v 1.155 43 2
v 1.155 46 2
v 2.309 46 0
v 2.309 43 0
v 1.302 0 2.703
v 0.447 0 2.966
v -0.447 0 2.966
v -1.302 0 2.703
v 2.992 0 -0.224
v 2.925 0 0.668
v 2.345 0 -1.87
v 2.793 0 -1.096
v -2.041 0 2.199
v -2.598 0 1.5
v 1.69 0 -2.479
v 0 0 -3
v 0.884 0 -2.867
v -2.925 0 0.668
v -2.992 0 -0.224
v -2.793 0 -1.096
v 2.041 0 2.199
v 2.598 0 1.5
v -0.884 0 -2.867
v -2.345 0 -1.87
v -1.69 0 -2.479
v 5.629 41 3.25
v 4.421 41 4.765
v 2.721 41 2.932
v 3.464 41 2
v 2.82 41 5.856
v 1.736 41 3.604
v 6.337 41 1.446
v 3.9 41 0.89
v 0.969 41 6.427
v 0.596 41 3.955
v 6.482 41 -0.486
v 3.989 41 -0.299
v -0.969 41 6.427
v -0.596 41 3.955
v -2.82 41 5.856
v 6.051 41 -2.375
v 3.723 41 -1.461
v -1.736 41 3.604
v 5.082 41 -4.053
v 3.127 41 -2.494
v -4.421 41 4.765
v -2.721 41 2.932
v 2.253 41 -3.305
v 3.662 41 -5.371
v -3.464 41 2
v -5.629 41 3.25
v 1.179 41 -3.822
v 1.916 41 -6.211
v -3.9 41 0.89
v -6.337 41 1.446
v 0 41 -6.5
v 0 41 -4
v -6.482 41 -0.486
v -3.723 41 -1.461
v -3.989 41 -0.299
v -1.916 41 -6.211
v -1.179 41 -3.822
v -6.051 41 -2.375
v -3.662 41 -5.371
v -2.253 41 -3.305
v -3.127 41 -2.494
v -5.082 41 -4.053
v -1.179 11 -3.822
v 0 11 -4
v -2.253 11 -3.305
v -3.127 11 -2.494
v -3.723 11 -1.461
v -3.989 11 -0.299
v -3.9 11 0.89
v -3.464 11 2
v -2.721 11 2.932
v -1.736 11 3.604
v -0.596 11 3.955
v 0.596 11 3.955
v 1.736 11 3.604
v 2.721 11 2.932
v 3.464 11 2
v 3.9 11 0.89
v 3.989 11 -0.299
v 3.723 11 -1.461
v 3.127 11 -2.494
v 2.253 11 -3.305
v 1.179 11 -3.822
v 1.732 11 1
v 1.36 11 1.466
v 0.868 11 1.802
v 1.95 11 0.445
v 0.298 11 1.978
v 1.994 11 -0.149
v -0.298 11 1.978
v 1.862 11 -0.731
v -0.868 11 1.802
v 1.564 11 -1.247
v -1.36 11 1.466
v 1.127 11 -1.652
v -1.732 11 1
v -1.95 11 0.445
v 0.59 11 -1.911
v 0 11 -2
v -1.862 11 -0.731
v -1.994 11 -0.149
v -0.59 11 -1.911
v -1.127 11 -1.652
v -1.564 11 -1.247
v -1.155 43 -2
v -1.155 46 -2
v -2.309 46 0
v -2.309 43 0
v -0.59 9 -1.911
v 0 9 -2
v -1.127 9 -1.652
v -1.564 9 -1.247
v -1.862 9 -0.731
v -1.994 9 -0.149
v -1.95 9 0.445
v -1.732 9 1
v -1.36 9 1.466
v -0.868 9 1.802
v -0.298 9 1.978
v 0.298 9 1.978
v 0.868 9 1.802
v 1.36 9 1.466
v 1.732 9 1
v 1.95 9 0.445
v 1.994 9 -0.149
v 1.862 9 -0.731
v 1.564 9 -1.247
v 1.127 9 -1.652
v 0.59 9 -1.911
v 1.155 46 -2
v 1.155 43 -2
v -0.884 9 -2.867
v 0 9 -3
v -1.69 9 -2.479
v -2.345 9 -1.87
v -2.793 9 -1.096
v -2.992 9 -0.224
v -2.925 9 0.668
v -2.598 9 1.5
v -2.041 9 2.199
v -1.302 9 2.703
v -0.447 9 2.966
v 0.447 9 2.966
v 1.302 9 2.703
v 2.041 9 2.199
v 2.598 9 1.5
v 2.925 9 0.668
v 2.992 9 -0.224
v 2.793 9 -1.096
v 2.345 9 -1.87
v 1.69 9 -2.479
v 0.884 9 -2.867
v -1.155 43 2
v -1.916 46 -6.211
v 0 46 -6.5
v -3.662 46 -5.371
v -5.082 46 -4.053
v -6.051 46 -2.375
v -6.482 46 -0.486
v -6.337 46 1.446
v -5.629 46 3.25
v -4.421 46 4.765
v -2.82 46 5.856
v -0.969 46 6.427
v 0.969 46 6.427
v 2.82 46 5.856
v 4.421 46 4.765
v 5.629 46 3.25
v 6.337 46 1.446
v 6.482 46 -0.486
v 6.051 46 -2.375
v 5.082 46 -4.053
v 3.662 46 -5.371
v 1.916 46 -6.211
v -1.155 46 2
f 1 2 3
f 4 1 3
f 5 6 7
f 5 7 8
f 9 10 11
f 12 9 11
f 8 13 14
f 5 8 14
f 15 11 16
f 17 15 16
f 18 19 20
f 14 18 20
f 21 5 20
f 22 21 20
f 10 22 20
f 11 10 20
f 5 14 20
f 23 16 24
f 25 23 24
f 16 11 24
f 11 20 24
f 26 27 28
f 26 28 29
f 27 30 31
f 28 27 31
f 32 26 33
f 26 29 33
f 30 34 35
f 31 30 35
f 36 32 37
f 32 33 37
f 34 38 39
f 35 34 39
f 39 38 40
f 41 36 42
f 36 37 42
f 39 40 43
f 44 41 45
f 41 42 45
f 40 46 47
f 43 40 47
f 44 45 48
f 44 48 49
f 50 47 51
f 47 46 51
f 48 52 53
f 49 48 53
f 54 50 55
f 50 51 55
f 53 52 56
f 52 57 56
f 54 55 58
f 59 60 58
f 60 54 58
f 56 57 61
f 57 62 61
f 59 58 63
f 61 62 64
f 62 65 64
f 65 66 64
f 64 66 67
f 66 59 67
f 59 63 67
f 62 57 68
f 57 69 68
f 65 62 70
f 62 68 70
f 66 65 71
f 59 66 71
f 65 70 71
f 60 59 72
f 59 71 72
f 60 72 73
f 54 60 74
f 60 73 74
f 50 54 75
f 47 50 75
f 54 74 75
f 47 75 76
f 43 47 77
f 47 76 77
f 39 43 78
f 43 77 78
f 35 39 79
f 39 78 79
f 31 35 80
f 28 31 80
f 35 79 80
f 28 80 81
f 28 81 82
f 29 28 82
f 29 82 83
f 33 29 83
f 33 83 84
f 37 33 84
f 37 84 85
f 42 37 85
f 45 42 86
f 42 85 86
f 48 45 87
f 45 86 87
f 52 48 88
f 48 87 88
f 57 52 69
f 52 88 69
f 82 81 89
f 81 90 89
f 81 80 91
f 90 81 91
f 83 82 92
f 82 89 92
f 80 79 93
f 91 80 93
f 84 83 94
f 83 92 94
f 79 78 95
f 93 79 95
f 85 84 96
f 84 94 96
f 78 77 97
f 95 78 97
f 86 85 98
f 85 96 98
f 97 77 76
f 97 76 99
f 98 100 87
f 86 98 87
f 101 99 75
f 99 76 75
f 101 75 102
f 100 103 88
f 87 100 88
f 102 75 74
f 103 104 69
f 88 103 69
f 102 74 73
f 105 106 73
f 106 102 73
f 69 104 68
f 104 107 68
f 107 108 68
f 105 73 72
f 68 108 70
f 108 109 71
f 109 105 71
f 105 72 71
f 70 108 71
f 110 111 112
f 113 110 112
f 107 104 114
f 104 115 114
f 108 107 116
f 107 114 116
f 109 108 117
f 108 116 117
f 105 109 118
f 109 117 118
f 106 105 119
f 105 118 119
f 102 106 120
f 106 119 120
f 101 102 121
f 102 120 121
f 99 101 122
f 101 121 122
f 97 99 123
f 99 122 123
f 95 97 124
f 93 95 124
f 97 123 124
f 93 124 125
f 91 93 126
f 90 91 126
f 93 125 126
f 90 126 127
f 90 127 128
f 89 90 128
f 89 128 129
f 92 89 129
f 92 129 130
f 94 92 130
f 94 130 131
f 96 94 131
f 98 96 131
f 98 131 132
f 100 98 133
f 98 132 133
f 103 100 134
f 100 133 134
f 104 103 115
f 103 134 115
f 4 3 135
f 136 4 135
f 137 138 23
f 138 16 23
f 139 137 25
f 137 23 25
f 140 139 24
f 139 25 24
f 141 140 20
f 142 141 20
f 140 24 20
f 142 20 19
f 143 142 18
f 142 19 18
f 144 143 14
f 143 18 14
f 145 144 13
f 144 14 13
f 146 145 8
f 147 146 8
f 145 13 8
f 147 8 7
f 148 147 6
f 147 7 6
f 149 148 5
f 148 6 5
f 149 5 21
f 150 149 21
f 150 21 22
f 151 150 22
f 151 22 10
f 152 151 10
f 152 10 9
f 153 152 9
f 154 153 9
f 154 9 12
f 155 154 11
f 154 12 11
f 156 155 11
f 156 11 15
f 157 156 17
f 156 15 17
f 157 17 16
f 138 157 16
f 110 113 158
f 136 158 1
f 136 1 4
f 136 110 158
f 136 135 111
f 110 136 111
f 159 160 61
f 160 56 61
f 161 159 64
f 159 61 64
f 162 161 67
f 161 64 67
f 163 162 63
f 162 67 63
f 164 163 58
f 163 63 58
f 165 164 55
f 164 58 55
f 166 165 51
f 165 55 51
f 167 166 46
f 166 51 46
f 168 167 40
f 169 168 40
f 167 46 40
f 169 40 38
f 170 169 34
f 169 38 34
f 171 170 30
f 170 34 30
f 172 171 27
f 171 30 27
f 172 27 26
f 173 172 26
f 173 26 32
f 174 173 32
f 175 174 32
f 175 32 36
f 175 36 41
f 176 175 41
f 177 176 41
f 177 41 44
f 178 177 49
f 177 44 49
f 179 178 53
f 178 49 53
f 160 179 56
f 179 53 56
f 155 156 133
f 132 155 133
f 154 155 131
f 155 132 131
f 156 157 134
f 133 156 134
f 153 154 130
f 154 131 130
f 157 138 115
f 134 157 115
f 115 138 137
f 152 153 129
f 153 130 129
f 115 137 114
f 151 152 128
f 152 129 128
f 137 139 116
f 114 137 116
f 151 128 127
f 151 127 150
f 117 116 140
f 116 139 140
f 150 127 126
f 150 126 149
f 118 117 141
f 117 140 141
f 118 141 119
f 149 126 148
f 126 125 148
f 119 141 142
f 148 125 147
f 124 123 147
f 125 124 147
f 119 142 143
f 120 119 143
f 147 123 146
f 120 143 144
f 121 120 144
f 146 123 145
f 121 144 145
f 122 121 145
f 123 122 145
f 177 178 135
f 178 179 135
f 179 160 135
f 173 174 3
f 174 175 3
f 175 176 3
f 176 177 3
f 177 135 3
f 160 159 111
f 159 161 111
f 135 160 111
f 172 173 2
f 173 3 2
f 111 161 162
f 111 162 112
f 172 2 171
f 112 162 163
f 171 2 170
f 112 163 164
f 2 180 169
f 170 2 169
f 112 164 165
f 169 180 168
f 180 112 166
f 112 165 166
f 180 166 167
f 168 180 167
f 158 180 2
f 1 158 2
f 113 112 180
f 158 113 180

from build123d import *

# Parameters (mm, degrees)
CUT_EXTRUDE_1_DEPTH = 3


with BuildPart() as part:
    # 草图1 → 旋转1 (revolve)
    with BuildSketch(Plane.XY, mode=Mode.PRIVATE) as revolve_1_sk:
        Polygon((0, 46), (6.5, 46), (6.5, 41), (4, 41), (4, 11), (2, 11), (2, 9), (3, 9), (3, 0), (0, 0), align=None)
    revolve(revolve_1_sk.sketch.rotate(Axis((0, 0, 0), (0, 1, 0)), 90), axis=Axis((0, 0, 0), (0, 1, 0)))

    # 草图2 → 切除-拉伸1 (cut)
    with BuildSketch(Plane(origin=(0, 46, 0), x_dir=(1, 0, 0), z_dir=(0, 1, 0))):
        Polygon((1.154700538, 2), (-1.154700538, 2), (-2.309401077, 0), (-1.154700538, -2), (1.154700538, -2), (2.309401077, 0), align=None)
    extrude(amount=-CUT_EXTRUDE_1_DEPTH, mode=Mode.SUBTRACT)


solid = part.part
